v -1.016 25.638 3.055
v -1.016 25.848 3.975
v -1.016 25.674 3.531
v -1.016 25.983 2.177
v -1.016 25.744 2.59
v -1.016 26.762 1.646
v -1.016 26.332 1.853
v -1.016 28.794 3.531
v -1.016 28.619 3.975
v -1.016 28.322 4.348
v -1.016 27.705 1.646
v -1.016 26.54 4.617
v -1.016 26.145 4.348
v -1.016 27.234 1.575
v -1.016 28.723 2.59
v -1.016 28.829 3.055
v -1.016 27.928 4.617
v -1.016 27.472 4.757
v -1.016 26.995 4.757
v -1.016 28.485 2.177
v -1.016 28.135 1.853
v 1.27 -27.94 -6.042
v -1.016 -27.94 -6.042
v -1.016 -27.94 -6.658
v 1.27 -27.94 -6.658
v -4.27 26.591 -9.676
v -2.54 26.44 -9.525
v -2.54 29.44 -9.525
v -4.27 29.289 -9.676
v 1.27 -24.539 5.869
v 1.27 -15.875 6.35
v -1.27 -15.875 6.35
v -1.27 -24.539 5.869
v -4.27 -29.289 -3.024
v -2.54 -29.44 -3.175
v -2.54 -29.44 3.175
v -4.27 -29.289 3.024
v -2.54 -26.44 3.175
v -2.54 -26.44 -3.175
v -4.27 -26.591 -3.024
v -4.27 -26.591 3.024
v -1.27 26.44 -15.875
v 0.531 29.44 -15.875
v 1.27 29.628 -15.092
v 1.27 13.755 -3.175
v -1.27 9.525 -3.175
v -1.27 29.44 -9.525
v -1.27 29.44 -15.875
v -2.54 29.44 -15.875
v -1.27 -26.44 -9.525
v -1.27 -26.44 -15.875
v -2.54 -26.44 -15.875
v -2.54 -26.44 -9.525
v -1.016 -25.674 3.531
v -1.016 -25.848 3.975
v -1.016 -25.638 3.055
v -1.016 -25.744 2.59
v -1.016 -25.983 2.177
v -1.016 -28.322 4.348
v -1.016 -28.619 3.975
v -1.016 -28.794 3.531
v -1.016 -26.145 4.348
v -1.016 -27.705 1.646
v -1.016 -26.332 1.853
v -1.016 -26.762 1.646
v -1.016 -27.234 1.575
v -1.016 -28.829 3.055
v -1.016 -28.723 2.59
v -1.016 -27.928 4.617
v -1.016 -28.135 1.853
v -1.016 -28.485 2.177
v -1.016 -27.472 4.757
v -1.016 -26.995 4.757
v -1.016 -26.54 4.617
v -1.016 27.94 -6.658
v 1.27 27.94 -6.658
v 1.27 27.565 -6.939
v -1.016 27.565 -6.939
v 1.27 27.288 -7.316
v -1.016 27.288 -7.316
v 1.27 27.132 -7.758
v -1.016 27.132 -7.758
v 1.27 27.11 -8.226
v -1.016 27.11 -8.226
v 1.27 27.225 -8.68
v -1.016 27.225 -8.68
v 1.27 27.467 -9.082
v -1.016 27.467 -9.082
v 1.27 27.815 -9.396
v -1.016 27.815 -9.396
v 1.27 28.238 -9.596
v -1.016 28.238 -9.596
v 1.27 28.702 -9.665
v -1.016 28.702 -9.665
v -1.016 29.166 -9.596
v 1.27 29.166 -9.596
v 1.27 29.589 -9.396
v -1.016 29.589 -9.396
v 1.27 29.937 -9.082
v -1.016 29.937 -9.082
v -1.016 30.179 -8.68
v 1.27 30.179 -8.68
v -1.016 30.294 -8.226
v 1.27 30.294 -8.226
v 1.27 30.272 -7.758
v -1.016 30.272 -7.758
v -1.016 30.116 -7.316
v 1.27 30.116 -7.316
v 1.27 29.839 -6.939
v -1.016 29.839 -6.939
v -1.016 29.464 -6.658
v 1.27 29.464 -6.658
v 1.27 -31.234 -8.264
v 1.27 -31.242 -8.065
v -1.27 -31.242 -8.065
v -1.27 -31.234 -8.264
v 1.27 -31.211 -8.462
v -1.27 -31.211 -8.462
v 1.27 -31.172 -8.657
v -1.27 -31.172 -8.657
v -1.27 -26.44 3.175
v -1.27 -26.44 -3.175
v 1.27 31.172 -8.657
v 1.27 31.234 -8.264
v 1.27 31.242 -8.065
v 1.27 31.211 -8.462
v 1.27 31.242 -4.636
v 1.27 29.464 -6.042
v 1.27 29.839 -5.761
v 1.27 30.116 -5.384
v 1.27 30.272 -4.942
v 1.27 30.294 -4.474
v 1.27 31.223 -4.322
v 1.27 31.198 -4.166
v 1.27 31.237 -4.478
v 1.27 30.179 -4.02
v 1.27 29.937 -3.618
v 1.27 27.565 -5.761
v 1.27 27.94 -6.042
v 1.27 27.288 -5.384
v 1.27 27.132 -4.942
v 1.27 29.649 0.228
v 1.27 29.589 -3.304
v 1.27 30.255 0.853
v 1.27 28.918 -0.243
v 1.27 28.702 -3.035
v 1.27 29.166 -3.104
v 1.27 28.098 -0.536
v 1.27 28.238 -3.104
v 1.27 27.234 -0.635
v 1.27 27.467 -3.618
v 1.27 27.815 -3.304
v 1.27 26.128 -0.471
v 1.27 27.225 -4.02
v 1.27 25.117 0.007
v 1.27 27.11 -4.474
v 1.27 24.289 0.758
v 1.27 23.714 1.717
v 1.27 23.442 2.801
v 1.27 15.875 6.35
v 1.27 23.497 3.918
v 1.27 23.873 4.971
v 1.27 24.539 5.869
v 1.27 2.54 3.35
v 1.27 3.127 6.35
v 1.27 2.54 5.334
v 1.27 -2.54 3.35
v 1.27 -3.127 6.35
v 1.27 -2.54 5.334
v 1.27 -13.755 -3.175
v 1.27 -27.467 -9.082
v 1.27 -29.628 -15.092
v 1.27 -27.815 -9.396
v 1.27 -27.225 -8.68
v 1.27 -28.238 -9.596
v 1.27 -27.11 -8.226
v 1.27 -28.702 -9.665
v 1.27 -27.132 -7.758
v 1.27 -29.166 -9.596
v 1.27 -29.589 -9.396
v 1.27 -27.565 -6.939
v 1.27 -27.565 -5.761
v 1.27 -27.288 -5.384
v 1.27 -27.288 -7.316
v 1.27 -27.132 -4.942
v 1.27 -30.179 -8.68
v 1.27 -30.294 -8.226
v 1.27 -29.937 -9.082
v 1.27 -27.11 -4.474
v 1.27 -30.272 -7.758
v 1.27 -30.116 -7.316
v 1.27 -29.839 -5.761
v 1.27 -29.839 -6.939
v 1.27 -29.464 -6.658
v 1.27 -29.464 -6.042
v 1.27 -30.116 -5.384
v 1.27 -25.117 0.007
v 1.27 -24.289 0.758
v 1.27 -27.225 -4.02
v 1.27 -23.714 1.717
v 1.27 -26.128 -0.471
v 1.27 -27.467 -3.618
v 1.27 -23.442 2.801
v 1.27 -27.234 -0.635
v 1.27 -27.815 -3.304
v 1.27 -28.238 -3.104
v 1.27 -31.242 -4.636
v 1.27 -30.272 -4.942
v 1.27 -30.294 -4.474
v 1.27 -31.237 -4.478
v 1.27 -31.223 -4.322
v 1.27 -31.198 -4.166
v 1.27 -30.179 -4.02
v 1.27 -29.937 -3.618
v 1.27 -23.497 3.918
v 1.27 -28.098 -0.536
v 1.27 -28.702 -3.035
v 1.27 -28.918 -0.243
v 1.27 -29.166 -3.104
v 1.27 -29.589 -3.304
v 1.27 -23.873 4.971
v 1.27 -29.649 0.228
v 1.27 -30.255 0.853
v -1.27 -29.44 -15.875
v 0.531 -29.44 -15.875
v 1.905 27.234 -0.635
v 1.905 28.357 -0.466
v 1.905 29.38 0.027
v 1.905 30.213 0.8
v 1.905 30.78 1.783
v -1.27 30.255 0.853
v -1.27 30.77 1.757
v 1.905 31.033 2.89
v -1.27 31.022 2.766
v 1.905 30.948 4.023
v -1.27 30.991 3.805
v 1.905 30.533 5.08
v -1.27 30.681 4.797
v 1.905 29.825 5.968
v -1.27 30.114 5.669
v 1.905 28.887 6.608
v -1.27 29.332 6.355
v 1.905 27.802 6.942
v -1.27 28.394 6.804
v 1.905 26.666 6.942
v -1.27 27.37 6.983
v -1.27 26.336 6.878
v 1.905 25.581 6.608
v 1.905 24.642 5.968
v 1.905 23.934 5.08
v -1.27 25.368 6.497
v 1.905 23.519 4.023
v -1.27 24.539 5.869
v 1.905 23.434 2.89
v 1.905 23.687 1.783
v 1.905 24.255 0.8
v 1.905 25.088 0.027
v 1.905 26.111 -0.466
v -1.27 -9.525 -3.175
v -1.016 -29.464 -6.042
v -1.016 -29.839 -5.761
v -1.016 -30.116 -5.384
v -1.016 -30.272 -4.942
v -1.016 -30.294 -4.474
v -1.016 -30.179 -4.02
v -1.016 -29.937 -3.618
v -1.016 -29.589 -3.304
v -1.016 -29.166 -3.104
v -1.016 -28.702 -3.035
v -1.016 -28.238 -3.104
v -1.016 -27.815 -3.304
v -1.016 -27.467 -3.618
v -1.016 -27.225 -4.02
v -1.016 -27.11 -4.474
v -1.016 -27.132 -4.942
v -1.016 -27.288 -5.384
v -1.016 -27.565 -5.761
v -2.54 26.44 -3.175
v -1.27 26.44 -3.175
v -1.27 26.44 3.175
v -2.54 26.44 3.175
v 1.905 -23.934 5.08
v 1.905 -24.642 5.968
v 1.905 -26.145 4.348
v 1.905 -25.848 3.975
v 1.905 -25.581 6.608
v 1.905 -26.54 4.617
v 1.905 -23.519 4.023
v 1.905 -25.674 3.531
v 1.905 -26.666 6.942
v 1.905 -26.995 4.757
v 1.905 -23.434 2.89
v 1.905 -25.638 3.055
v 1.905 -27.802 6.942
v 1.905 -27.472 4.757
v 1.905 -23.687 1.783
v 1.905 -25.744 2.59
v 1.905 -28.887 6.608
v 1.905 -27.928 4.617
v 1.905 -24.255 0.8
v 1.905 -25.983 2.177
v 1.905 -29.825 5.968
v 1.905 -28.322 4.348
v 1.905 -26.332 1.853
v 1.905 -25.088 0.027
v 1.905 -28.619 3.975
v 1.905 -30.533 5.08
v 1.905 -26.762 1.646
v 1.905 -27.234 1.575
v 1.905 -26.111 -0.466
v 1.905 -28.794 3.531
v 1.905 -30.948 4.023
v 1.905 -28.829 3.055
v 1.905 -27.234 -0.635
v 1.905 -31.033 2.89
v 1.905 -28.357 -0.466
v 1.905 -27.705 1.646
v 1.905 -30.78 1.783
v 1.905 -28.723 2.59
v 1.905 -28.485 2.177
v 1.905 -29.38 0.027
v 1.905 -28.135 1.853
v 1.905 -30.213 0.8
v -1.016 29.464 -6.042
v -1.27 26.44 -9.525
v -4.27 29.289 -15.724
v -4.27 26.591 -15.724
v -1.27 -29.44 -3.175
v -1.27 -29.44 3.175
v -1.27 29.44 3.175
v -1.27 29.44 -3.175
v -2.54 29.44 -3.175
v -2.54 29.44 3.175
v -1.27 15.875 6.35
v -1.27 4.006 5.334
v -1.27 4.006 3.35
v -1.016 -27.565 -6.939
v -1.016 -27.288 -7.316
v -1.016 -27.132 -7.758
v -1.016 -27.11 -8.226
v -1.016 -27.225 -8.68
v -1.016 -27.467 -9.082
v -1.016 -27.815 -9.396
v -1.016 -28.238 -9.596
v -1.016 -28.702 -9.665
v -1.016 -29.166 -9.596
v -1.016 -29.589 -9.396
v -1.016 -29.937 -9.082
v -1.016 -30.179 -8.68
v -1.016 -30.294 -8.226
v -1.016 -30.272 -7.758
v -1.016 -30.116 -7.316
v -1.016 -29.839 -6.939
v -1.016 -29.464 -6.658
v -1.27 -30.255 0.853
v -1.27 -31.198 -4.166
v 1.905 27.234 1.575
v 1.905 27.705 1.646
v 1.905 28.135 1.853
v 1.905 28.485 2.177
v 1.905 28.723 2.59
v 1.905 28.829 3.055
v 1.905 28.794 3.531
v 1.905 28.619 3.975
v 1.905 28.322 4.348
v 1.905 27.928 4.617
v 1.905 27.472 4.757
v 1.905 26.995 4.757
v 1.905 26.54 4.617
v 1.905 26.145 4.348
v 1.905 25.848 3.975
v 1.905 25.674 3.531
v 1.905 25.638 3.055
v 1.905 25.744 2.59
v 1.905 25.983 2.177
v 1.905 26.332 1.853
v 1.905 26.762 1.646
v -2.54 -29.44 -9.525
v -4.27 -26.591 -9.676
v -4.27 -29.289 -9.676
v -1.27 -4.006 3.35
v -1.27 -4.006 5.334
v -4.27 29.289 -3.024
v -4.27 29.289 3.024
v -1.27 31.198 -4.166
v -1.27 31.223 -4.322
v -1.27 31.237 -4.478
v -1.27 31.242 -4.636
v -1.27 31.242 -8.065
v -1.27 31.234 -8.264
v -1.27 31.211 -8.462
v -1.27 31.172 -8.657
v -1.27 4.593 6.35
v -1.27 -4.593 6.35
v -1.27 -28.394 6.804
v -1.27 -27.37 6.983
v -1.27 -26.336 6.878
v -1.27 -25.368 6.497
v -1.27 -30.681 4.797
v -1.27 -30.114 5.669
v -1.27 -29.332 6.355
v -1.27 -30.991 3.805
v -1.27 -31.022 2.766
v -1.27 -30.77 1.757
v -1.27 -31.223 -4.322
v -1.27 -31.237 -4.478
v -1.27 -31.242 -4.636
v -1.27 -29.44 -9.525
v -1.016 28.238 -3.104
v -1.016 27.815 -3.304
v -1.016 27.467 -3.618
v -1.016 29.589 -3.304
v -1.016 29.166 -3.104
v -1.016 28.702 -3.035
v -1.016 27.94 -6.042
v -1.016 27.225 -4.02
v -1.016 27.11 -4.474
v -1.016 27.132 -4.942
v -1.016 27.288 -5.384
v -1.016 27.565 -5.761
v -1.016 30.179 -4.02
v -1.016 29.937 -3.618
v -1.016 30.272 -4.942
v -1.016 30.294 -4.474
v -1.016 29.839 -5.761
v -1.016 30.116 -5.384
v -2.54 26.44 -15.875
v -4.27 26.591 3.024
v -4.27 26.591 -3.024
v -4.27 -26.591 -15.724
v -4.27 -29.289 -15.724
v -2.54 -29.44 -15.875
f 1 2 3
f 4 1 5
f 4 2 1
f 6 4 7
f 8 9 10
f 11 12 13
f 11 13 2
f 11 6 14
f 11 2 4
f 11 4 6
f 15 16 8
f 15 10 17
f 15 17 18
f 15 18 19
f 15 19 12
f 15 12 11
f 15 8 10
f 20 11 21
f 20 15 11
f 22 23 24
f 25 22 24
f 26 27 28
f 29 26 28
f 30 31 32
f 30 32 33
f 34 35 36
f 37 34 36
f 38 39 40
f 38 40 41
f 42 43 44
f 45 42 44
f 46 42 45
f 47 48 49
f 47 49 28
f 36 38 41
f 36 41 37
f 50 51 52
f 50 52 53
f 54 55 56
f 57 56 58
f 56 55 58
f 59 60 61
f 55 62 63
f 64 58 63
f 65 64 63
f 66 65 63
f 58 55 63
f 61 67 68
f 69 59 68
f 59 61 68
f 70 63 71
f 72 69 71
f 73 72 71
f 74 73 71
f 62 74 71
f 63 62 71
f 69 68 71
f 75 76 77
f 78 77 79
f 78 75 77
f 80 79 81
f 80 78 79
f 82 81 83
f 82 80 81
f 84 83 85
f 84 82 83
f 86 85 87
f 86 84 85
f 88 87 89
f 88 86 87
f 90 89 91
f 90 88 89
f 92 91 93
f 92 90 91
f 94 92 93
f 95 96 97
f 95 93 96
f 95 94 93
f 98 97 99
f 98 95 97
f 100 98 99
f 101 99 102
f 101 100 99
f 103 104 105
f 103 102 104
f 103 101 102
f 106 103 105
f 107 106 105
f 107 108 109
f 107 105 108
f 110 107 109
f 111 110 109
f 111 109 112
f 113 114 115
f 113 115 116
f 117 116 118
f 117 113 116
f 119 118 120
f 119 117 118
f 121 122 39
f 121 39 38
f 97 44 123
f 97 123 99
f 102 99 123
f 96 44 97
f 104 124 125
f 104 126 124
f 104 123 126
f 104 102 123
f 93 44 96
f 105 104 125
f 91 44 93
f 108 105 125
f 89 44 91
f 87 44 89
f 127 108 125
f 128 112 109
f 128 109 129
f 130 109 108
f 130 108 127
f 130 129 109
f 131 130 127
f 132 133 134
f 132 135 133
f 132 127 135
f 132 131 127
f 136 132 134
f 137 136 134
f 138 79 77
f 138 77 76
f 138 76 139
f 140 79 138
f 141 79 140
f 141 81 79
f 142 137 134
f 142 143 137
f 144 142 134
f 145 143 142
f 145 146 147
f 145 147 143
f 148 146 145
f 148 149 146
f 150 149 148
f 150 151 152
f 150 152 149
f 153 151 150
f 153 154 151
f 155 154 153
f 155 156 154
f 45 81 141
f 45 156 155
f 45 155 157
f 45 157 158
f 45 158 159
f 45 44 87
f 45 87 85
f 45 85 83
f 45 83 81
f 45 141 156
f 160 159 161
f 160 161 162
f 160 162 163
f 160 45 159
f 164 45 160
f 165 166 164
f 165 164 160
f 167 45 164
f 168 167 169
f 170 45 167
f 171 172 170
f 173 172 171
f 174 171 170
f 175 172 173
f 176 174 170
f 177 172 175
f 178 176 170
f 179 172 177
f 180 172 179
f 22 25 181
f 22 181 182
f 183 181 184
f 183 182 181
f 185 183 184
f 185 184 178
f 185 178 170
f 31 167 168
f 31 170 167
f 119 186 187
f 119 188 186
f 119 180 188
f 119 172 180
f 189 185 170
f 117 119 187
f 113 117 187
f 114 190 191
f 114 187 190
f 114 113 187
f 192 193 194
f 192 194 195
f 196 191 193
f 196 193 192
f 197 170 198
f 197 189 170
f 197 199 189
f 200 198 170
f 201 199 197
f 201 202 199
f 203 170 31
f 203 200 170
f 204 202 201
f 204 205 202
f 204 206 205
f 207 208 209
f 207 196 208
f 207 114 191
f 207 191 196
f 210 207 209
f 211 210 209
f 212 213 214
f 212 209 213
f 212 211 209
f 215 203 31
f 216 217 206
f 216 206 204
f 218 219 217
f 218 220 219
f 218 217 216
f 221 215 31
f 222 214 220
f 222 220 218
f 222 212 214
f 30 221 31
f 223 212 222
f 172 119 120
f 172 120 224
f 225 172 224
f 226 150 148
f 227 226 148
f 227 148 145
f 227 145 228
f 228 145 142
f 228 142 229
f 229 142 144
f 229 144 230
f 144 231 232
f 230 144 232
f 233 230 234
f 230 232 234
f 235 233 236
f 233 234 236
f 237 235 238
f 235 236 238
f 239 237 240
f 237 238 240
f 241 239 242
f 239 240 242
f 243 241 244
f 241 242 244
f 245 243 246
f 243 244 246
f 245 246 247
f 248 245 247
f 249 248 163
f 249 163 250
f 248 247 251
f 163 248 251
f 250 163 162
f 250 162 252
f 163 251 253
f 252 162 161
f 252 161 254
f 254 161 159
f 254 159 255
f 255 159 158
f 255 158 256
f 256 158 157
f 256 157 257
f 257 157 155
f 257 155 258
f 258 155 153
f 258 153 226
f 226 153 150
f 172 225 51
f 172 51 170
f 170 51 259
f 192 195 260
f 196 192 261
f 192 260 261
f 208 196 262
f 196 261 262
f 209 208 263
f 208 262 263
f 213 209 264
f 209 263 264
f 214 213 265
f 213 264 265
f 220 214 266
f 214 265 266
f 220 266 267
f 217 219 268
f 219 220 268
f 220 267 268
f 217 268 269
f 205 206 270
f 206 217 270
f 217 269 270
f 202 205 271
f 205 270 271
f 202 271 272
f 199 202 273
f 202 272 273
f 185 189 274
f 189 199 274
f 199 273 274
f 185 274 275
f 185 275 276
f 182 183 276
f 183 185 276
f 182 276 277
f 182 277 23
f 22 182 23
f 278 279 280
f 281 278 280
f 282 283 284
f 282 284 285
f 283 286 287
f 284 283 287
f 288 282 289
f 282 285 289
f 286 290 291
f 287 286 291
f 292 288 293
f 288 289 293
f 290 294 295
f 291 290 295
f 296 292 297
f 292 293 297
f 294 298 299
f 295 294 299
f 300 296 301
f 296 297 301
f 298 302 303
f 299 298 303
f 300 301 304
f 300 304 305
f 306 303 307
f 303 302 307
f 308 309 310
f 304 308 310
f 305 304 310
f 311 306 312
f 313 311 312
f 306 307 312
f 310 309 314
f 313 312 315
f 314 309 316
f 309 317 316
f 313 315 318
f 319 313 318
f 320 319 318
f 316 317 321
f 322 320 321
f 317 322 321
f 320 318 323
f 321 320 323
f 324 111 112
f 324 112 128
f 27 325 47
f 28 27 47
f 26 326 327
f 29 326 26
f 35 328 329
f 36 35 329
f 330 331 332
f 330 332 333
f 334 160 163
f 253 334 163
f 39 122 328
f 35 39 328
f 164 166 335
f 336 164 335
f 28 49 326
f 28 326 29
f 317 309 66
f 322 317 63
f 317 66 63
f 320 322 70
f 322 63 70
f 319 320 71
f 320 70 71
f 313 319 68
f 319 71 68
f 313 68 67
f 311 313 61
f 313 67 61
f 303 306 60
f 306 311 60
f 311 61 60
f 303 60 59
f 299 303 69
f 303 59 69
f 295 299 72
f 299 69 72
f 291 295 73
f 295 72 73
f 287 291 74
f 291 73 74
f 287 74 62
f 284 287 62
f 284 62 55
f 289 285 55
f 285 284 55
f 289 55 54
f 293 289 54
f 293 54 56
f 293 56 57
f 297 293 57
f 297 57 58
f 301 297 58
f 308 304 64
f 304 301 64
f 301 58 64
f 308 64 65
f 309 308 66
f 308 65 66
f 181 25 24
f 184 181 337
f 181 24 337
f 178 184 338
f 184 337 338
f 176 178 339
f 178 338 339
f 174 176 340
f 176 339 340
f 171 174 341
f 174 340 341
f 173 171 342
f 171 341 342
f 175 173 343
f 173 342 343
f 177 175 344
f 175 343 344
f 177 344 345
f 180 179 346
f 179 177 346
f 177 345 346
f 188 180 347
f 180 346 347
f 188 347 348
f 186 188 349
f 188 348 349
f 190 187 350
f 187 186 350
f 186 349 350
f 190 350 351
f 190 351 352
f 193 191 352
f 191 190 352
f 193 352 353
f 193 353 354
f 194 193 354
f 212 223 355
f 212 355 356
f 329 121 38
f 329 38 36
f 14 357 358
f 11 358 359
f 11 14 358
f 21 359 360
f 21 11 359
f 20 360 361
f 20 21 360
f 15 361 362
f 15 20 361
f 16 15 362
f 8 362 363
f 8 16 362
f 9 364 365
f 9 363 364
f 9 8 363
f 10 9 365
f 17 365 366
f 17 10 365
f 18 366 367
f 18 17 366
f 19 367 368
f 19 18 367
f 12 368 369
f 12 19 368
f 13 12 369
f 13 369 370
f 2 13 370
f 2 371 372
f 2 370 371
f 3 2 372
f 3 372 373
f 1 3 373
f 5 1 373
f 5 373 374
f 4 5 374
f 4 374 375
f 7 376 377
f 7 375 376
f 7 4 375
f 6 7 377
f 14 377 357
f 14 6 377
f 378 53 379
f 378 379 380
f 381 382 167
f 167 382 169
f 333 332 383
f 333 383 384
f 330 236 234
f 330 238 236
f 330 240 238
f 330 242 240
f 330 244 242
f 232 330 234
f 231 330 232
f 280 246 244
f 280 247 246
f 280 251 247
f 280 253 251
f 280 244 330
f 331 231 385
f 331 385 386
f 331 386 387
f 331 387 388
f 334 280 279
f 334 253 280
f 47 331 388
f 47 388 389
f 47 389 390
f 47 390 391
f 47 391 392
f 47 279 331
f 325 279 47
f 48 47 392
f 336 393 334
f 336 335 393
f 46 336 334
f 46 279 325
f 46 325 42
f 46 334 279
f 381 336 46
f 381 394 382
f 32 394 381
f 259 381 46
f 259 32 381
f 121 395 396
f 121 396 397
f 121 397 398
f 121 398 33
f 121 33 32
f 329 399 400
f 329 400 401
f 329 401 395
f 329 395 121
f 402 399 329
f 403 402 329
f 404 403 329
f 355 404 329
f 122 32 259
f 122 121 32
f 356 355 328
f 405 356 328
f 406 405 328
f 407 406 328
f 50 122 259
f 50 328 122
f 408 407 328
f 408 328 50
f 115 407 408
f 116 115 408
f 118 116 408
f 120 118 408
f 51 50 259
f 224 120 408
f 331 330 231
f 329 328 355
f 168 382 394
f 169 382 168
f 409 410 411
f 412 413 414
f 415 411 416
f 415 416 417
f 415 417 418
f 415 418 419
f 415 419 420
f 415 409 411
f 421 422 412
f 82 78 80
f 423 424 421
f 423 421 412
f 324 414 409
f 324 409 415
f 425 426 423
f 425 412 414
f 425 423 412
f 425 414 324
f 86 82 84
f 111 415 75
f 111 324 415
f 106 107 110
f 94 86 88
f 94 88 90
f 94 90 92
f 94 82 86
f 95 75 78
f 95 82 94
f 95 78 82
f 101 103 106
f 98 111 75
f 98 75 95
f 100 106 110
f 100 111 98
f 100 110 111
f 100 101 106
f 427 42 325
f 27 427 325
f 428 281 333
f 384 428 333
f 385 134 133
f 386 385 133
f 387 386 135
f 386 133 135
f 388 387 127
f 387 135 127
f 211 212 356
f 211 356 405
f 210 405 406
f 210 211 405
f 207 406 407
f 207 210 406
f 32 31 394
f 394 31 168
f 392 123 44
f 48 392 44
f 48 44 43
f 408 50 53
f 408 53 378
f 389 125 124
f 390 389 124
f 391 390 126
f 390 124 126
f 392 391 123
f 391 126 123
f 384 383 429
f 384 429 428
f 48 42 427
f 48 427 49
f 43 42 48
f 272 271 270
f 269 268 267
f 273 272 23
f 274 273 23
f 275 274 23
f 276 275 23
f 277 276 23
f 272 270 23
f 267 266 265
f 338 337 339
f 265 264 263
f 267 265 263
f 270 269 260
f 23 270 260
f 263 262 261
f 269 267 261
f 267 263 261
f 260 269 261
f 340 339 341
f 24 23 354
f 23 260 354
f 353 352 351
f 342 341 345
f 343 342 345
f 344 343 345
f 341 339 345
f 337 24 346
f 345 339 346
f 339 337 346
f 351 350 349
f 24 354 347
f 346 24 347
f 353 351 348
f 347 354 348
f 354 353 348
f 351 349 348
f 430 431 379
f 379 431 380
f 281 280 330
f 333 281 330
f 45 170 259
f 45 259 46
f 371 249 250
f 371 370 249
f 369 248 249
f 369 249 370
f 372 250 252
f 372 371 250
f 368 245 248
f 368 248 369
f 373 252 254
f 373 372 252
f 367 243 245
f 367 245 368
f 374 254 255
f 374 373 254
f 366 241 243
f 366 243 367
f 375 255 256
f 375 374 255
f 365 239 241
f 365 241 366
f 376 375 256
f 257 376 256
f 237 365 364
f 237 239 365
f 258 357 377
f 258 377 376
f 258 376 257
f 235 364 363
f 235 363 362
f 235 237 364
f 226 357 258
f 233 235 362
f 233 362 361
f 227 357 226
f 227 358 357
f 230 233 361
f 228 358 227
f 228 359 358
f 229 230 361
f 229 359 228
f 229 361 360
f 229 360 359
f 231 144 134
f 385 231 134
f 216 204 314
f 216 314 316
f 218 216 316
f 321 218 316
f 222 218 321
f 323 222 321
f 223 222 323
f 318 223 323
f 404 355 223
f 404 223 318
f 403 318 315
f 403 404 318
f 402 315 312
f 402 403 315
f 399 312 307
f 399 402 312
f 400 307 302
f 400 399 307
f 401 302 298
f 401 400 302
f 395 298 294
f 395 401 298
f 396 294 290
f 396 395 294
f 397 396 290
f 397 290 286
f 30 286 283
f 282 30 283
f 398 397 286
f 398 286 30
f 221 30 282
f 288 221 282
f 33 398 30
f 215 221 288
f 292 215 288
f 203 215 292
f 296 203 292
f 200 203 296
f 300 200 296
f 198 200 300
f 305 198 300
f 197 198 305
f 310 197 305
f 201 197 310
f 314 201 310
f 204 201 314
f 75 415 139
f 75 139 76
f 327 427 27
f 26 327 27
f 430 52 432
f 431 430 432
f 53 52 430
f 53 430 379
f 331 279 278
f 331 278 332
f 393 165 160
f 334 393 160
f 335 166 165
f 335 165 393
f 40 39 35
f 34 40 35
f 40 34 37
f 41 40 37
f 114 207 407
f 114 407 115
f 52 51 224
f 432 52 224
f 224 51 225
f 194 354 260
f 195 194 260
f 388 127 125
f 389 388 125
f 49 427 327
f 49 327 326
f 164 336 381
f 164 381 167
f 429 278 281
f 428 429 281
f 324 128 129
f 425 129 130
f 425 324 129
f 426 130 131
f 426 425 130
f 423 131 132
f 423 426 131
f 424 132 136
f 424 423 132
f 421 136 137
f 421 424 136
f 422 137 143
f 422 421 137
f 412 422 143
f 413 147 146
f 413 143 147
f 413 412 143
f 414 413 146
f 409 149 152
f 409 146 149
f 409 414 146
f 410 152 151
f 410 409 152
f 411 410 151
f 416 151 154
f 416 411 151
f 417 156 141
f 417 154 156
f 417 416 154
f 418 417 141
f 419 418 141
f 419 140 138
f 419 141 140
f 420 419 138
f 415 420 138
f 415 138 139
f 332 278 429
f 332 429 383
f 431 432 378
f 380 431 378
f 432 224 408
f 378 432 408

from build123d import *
from OCP.BRepFilletAPI import BRepFilletAPI_MakeChamfer

# Parameters (mm, degrees)
DOWELSUPPORT_DEPTH       = 1.905
DOWELSUPPORT_DEPTH_BACK  = 1.27
SKETCH3_R                = 3.81
SKETCH5_W                = 9.525
SKETCH5_H                = 31.75
SLIDERDOWELSUPPORT_DEPTH = 1.27
STRINGDOWELSUPPORT_DEPTH = 1.27
SKETCH9_W                = 6.35
SKETCH9_H                = 3
TABSUPPORT_DEPTH         = 1.27
INTERSUPPORT_DEPTH       = 1.27
DOWELHOLES_DEPTH         = 36.095686544
DOWELHOLES_DEPTH_BACK    = 36.095686544
SKETCH11_R               = 1.600000102
BOSS_EXTRUDE1_START      = -1.27
SKETCH11_2_R             = 1.600000102
BOSS_EXTRUDE1_DEPTH      = 0.254
SKETCH14_W               = 6.35
SKETCH14_H               = 3
TABBASE_DEPTH            = 1.27
SKETCH15_W               = 6.35
SKETCH15_H               = 3
TABDRAFT_DEPTH           = 1.73
TABDRAFT_DRAFT           = 5
TABDRAFT_PROFILE_2_DEPTH = 1.73
TABDRAFT_PROFILE_2_DRAFT = 5
CHAMFER2_SIZE            = 2.54
CUT_EXTRUDE1_DEPTH       = 3
CHAMFER3_SIZE            = 0.508
CHAMFER3_SIZE2           = 1.016


with BuildPart() as part:
    # Sketch3 → DowelSupport (new, two sides: drawn at the far end of the back side and taken through both)
    with BuildSketch(Plane(origin=(0, 0, 0), x_dir=(0, 0, -1), z_dir=(1, 0, 0)).offset(-DOWELSUPPORT_DEPTH_BACK)):
        with Locations((-3.175, 27.23375)):
            Circle(SKETCH3_R)
    extrude(amount=DOWELSUPPORT_DEPTH + DOWELSUPPORT_DEPTH_BACK)



with BuildPart() as body_2:
    # Sketch5 → SliderDowelSupport (new, symmetric)
    with BuildSketch(Plane(origin=(0, 0, 0), x_dir=(0, 0, -1), z_dir=(1, 0, 0))):
        with Locations((-1.5875, 0)):
            Rectangle(SKETCH5_W, SKETCH5_H)
    extrude(amount=SLIDERDOWELSUPPORT_DEPTH, both=True)


with BuildPart() as body_3:
    # Sketch8 → StringDowelSupport (new, symmetric)
    with BuildSketch(Plane(origin=(0, 0, 0), x_dir=(0, 0, -1), z_dir=(1, 0, 0))):
        with BuildLine():
            Line((4.6355, 31.242), (8.0645, 31.242))
            ThreePointArc((8.0645, 31.242), (10.6045, 28.702), (8.0645, 26.162))
            Line((8.0645, 26.162), (4.6355, 26.162))
            ThreePointArc((4.6355, 26.162), (2.0955, 28.702), (4.6355, 31.242))
        make_face()
    extrude(amount=STRINGDOWELSUPPORT_DEPTH, both=True)


with BuildPart() as part_1:
    add(part.part)

    add(body_3.part)  # TabSupport merges body 3
    # Sketch9 → TabSupport (add, symmetric)
    with BuildSketch(Plane(origin=(0, 0, 0), x_dir=(0, 0, -1), z_dir=(1, 0, 0))):
        with Locations((0, 27.94)):
            Rectangle(SKETCH9_W, SKETCH9_H)
        with Locations((12.7, 27.94)):
            Rectangle(SKETCH9_W, SKETCH9_H)
    extrude(amount=TABSUPPORT_DEPTH, both=True)


    add(body_2.part)  # InterSupport merges body 2
    # Sketch10 → InterSupport (add, symmetric)
    with BuildSketch(Plane(origin=(0, 0, 0), x_dir=(0, 0, -1), z_dir=(1, 0, 0))):
        Polygon((-6.35, 15.875), (-5.711088789, 27.374652996), (-3.644260291, 29.730026182), (4.166239709, 31.198276182), (8.657140431, 31.171894192), (15.875, 29.44), (15.875, 26.44), (3.175, 9.525), (3.175, 15.875), align=None)
    extrude(amount=INTERSUPPORT_DEPTH, both=True)

    # Sketch11 → DowelHoles (cut, two sides: drawn at the far end of the back side and taken through both)
    with BuildSketch(Plane(origin=(0, 0, 0), x_dir=(0, 0, -1), z_dir=(1, 0, 0)).offset(-DOWELHOLES_DEPTH_BACK)):
        with Locations((-3.175, 27.23375)):
            Circle(SKETCH11_R)
        with BuildLine():
            Line((6.04239599, 27.94), (6.65760401, 27.94))
            ThreePointArc((6.65760401, 27.94), (9.664500102, 28.702), (6.65760401, 29.464))
            Line((6.65760401, 29.464), (6.04239599, 29.464))
            ThreePointArc((6.04239599, 29.464), (3.035499898, 28.702), (6.04239599, 27.94))
        make_face()
    extrude(amount=DOWELHOLES_DEPTH + DOWELHOLES_DEPTH_BACK, mode=Mode.SUBTRACT)

    # Sketch11<2> → Boss-Extrude1 (add)
    with BuildSketch(Plane(origin=(0, 0, 0), x_dir=(0, 0, -1), z_dir=(1, 0, 0)).offset(BOSS_EXTRUDE1_START)):
        with BuildLine():
            Line((6.04239599, 27.94), (6.65760401, 27.94))
            ThreePointArc((6.65760401, 27.94), (9.664500102, 28.702), (6.65760401, 29.464))
            Line((6.65760401, 29.464), (6.04239599, 29.464))
            ThreePointArc((6.04239599, 29.464), (3.035499898, 28.702), (6.04239599, 27.94))
        make_face()
        with Locations((-3.175, 27.23375)):
            Circle(SKETCH11_2_R)
    extrude(amount=BOSS_EXTRUDE1_DEPTH)

    # Sketch14 → TabBase (add)
    with BuildSketch(Plane.ZY.offset(1.27)):
        with Locations((-12.7, 27.94)):
            Rectangle(SKETCH14_W, SKETCH14_H)
        with Locations((0, 27.94)):
            Rectangle(SKETCH14_W, SKETCH14_H)
    extrude(amount=TABBASE_DEPTH)


with BuildPart() as tabdraft_tool:
    # Sketch15 → TabDraft (with draft: the straight prism first)
    with BuildSketch(Plane.ZY.offset(2.54)):
        with Locations((0, 27.94)):
            Rectangle(SKETCH15_W, SKETCH15_H)
    extrude(amount=TABDRAFT_DEPTH)
    # TabDraft: the draft: its side faces are tilted about the plane it starts from
    tabdraft_sides = [tabdraft_tool.faces().sort_by_distance(p)[0] for p in [
        (-3.405, 27.94, -3.175),
        (-3.405, 26.44, 0),
        (-3.405, 27.94, 3.175),
        (-3.405, 29.44, 0),
    ]]
    draft(tabdraft_sides, Plane.ZY.offset(2.54), TABDRAFT_DRAFT)


with BuildPart() as part_2:
    add(part_1.part)

    # TabDraft: add tabdraft_tool
    add(tabdraft_tool.part)


with BuildPart() as tabdraft_profile_2_tool:
    # Sketch15 → TabDraft profile 2 (with draft: the straight prism first)
    with BuildSketch(Plane.ZY.offset(2.54)):
        with Locations((-12.7, 27.94)):
            Rectangle(SKETCH15_W, SKETCH15_H)
    extrude(amount=TABDRAFT_PROFILE_2_DEPTH)
    # TabDraft profile 2: the draft: its side faces are tilted about the plane it starts from
    tabdraft_profile_2_sides = [tabdraft_profile_2_tool.faces().sort_by_distance(p)[0] for p in [
        (-3.405, 27.94, -15.875),
        (-3.405, 26.44, -12.7),
        (-3.405, 27.94, -9.525),
        (-3.405, 29.44, -12.7),
    ]]
    draft(tabdraft_profile_2_sides, Plane.ZY.offset(2.54), TABDRAFT_PROFILE_2_DRAFT)


with BuildPart() as part_3:
    add(part_2.part)

    # TabDraft profile 2: add tabdraft_profile_2_tool
    add(tabdraft_profile_2_tool.part)

    # Chamfer2
    chamfer2_edges = [part_3.edges().sort_by_distance(p)[0] for p in [
        (1.27, 17.9825, -9.525),
    ]]
    chamfer(chamfer2_edges, length=CHAMFER2_SIZE - 0.0001)  # a hair under: the kernel refuses the full size

    # Mirror1: part across plane


with BuildPart() as part_4:
    add(part_3.part)
    add(part_3.part.mirror(Plane.ZX))

    # Sketch16 → Cut-Extrude1 (cut)
    with BuildSketch(Plane.XY.offset(6.35)):
        Polygon((-1.27, 4.006469684), (-1.27, -4.006469684), (1.27, -2.54), (1.27, 2.54), align=None)
    extrude(amount=-CUT_EXTRUDE1_DEPTH, mode=Mode.SUBTRACT)

    # Chamfer3: one chamfer whose edges measure the first distance from different faces: ONE call of the kernel's chamfer builder (chamfer() names one face for all edges)
    chamfer3_edges_1 = [part_4.edges().sort_by_distance(p)[0] for p in [
        (0, 3.273234842, 6.35),
    ]]
    chamfer3_side_1 = [part_4.faces().sort_by_distance(p)[0] for p in [
        (0.024631688, 9.567006865, 6.35),
    ]]
    chamfer3_edges_2 = [part_4.edges().sort_by_distance(p)[0] for p in [
        (0, -3.273234842, 6.35),
    ]]
    chamfer3_side_2 = [part_4.faces().sort_by_distance(p)[0] for p in [
        (0.024631688, -9.567006865, 6.35),
    ]]
    chamfer3 = BRepFilletAPI_MakeChamfer(part_4.part.solid().wrapped)
    for e in chamfer3_edges_1:
        chamfer3.Add(CHAMFER3_SIZE, CHAMFER3_SIZE2, e.wrapped, chamfer3_side_1[0].wrapped)  # the first distance lies on this face
    for e in chamfer3_edges_2:
        chamfer3.Add(CHAMFER3_SIZE, CHAMFER3_SIZE2, e.wrapped, chamfer3_side_2[0].wrapped)  # the first distance lies on this face
    add(Compound.cast(chamfer3.Shape()), mode=Mode.REPLACE)


solid = part_4.part
